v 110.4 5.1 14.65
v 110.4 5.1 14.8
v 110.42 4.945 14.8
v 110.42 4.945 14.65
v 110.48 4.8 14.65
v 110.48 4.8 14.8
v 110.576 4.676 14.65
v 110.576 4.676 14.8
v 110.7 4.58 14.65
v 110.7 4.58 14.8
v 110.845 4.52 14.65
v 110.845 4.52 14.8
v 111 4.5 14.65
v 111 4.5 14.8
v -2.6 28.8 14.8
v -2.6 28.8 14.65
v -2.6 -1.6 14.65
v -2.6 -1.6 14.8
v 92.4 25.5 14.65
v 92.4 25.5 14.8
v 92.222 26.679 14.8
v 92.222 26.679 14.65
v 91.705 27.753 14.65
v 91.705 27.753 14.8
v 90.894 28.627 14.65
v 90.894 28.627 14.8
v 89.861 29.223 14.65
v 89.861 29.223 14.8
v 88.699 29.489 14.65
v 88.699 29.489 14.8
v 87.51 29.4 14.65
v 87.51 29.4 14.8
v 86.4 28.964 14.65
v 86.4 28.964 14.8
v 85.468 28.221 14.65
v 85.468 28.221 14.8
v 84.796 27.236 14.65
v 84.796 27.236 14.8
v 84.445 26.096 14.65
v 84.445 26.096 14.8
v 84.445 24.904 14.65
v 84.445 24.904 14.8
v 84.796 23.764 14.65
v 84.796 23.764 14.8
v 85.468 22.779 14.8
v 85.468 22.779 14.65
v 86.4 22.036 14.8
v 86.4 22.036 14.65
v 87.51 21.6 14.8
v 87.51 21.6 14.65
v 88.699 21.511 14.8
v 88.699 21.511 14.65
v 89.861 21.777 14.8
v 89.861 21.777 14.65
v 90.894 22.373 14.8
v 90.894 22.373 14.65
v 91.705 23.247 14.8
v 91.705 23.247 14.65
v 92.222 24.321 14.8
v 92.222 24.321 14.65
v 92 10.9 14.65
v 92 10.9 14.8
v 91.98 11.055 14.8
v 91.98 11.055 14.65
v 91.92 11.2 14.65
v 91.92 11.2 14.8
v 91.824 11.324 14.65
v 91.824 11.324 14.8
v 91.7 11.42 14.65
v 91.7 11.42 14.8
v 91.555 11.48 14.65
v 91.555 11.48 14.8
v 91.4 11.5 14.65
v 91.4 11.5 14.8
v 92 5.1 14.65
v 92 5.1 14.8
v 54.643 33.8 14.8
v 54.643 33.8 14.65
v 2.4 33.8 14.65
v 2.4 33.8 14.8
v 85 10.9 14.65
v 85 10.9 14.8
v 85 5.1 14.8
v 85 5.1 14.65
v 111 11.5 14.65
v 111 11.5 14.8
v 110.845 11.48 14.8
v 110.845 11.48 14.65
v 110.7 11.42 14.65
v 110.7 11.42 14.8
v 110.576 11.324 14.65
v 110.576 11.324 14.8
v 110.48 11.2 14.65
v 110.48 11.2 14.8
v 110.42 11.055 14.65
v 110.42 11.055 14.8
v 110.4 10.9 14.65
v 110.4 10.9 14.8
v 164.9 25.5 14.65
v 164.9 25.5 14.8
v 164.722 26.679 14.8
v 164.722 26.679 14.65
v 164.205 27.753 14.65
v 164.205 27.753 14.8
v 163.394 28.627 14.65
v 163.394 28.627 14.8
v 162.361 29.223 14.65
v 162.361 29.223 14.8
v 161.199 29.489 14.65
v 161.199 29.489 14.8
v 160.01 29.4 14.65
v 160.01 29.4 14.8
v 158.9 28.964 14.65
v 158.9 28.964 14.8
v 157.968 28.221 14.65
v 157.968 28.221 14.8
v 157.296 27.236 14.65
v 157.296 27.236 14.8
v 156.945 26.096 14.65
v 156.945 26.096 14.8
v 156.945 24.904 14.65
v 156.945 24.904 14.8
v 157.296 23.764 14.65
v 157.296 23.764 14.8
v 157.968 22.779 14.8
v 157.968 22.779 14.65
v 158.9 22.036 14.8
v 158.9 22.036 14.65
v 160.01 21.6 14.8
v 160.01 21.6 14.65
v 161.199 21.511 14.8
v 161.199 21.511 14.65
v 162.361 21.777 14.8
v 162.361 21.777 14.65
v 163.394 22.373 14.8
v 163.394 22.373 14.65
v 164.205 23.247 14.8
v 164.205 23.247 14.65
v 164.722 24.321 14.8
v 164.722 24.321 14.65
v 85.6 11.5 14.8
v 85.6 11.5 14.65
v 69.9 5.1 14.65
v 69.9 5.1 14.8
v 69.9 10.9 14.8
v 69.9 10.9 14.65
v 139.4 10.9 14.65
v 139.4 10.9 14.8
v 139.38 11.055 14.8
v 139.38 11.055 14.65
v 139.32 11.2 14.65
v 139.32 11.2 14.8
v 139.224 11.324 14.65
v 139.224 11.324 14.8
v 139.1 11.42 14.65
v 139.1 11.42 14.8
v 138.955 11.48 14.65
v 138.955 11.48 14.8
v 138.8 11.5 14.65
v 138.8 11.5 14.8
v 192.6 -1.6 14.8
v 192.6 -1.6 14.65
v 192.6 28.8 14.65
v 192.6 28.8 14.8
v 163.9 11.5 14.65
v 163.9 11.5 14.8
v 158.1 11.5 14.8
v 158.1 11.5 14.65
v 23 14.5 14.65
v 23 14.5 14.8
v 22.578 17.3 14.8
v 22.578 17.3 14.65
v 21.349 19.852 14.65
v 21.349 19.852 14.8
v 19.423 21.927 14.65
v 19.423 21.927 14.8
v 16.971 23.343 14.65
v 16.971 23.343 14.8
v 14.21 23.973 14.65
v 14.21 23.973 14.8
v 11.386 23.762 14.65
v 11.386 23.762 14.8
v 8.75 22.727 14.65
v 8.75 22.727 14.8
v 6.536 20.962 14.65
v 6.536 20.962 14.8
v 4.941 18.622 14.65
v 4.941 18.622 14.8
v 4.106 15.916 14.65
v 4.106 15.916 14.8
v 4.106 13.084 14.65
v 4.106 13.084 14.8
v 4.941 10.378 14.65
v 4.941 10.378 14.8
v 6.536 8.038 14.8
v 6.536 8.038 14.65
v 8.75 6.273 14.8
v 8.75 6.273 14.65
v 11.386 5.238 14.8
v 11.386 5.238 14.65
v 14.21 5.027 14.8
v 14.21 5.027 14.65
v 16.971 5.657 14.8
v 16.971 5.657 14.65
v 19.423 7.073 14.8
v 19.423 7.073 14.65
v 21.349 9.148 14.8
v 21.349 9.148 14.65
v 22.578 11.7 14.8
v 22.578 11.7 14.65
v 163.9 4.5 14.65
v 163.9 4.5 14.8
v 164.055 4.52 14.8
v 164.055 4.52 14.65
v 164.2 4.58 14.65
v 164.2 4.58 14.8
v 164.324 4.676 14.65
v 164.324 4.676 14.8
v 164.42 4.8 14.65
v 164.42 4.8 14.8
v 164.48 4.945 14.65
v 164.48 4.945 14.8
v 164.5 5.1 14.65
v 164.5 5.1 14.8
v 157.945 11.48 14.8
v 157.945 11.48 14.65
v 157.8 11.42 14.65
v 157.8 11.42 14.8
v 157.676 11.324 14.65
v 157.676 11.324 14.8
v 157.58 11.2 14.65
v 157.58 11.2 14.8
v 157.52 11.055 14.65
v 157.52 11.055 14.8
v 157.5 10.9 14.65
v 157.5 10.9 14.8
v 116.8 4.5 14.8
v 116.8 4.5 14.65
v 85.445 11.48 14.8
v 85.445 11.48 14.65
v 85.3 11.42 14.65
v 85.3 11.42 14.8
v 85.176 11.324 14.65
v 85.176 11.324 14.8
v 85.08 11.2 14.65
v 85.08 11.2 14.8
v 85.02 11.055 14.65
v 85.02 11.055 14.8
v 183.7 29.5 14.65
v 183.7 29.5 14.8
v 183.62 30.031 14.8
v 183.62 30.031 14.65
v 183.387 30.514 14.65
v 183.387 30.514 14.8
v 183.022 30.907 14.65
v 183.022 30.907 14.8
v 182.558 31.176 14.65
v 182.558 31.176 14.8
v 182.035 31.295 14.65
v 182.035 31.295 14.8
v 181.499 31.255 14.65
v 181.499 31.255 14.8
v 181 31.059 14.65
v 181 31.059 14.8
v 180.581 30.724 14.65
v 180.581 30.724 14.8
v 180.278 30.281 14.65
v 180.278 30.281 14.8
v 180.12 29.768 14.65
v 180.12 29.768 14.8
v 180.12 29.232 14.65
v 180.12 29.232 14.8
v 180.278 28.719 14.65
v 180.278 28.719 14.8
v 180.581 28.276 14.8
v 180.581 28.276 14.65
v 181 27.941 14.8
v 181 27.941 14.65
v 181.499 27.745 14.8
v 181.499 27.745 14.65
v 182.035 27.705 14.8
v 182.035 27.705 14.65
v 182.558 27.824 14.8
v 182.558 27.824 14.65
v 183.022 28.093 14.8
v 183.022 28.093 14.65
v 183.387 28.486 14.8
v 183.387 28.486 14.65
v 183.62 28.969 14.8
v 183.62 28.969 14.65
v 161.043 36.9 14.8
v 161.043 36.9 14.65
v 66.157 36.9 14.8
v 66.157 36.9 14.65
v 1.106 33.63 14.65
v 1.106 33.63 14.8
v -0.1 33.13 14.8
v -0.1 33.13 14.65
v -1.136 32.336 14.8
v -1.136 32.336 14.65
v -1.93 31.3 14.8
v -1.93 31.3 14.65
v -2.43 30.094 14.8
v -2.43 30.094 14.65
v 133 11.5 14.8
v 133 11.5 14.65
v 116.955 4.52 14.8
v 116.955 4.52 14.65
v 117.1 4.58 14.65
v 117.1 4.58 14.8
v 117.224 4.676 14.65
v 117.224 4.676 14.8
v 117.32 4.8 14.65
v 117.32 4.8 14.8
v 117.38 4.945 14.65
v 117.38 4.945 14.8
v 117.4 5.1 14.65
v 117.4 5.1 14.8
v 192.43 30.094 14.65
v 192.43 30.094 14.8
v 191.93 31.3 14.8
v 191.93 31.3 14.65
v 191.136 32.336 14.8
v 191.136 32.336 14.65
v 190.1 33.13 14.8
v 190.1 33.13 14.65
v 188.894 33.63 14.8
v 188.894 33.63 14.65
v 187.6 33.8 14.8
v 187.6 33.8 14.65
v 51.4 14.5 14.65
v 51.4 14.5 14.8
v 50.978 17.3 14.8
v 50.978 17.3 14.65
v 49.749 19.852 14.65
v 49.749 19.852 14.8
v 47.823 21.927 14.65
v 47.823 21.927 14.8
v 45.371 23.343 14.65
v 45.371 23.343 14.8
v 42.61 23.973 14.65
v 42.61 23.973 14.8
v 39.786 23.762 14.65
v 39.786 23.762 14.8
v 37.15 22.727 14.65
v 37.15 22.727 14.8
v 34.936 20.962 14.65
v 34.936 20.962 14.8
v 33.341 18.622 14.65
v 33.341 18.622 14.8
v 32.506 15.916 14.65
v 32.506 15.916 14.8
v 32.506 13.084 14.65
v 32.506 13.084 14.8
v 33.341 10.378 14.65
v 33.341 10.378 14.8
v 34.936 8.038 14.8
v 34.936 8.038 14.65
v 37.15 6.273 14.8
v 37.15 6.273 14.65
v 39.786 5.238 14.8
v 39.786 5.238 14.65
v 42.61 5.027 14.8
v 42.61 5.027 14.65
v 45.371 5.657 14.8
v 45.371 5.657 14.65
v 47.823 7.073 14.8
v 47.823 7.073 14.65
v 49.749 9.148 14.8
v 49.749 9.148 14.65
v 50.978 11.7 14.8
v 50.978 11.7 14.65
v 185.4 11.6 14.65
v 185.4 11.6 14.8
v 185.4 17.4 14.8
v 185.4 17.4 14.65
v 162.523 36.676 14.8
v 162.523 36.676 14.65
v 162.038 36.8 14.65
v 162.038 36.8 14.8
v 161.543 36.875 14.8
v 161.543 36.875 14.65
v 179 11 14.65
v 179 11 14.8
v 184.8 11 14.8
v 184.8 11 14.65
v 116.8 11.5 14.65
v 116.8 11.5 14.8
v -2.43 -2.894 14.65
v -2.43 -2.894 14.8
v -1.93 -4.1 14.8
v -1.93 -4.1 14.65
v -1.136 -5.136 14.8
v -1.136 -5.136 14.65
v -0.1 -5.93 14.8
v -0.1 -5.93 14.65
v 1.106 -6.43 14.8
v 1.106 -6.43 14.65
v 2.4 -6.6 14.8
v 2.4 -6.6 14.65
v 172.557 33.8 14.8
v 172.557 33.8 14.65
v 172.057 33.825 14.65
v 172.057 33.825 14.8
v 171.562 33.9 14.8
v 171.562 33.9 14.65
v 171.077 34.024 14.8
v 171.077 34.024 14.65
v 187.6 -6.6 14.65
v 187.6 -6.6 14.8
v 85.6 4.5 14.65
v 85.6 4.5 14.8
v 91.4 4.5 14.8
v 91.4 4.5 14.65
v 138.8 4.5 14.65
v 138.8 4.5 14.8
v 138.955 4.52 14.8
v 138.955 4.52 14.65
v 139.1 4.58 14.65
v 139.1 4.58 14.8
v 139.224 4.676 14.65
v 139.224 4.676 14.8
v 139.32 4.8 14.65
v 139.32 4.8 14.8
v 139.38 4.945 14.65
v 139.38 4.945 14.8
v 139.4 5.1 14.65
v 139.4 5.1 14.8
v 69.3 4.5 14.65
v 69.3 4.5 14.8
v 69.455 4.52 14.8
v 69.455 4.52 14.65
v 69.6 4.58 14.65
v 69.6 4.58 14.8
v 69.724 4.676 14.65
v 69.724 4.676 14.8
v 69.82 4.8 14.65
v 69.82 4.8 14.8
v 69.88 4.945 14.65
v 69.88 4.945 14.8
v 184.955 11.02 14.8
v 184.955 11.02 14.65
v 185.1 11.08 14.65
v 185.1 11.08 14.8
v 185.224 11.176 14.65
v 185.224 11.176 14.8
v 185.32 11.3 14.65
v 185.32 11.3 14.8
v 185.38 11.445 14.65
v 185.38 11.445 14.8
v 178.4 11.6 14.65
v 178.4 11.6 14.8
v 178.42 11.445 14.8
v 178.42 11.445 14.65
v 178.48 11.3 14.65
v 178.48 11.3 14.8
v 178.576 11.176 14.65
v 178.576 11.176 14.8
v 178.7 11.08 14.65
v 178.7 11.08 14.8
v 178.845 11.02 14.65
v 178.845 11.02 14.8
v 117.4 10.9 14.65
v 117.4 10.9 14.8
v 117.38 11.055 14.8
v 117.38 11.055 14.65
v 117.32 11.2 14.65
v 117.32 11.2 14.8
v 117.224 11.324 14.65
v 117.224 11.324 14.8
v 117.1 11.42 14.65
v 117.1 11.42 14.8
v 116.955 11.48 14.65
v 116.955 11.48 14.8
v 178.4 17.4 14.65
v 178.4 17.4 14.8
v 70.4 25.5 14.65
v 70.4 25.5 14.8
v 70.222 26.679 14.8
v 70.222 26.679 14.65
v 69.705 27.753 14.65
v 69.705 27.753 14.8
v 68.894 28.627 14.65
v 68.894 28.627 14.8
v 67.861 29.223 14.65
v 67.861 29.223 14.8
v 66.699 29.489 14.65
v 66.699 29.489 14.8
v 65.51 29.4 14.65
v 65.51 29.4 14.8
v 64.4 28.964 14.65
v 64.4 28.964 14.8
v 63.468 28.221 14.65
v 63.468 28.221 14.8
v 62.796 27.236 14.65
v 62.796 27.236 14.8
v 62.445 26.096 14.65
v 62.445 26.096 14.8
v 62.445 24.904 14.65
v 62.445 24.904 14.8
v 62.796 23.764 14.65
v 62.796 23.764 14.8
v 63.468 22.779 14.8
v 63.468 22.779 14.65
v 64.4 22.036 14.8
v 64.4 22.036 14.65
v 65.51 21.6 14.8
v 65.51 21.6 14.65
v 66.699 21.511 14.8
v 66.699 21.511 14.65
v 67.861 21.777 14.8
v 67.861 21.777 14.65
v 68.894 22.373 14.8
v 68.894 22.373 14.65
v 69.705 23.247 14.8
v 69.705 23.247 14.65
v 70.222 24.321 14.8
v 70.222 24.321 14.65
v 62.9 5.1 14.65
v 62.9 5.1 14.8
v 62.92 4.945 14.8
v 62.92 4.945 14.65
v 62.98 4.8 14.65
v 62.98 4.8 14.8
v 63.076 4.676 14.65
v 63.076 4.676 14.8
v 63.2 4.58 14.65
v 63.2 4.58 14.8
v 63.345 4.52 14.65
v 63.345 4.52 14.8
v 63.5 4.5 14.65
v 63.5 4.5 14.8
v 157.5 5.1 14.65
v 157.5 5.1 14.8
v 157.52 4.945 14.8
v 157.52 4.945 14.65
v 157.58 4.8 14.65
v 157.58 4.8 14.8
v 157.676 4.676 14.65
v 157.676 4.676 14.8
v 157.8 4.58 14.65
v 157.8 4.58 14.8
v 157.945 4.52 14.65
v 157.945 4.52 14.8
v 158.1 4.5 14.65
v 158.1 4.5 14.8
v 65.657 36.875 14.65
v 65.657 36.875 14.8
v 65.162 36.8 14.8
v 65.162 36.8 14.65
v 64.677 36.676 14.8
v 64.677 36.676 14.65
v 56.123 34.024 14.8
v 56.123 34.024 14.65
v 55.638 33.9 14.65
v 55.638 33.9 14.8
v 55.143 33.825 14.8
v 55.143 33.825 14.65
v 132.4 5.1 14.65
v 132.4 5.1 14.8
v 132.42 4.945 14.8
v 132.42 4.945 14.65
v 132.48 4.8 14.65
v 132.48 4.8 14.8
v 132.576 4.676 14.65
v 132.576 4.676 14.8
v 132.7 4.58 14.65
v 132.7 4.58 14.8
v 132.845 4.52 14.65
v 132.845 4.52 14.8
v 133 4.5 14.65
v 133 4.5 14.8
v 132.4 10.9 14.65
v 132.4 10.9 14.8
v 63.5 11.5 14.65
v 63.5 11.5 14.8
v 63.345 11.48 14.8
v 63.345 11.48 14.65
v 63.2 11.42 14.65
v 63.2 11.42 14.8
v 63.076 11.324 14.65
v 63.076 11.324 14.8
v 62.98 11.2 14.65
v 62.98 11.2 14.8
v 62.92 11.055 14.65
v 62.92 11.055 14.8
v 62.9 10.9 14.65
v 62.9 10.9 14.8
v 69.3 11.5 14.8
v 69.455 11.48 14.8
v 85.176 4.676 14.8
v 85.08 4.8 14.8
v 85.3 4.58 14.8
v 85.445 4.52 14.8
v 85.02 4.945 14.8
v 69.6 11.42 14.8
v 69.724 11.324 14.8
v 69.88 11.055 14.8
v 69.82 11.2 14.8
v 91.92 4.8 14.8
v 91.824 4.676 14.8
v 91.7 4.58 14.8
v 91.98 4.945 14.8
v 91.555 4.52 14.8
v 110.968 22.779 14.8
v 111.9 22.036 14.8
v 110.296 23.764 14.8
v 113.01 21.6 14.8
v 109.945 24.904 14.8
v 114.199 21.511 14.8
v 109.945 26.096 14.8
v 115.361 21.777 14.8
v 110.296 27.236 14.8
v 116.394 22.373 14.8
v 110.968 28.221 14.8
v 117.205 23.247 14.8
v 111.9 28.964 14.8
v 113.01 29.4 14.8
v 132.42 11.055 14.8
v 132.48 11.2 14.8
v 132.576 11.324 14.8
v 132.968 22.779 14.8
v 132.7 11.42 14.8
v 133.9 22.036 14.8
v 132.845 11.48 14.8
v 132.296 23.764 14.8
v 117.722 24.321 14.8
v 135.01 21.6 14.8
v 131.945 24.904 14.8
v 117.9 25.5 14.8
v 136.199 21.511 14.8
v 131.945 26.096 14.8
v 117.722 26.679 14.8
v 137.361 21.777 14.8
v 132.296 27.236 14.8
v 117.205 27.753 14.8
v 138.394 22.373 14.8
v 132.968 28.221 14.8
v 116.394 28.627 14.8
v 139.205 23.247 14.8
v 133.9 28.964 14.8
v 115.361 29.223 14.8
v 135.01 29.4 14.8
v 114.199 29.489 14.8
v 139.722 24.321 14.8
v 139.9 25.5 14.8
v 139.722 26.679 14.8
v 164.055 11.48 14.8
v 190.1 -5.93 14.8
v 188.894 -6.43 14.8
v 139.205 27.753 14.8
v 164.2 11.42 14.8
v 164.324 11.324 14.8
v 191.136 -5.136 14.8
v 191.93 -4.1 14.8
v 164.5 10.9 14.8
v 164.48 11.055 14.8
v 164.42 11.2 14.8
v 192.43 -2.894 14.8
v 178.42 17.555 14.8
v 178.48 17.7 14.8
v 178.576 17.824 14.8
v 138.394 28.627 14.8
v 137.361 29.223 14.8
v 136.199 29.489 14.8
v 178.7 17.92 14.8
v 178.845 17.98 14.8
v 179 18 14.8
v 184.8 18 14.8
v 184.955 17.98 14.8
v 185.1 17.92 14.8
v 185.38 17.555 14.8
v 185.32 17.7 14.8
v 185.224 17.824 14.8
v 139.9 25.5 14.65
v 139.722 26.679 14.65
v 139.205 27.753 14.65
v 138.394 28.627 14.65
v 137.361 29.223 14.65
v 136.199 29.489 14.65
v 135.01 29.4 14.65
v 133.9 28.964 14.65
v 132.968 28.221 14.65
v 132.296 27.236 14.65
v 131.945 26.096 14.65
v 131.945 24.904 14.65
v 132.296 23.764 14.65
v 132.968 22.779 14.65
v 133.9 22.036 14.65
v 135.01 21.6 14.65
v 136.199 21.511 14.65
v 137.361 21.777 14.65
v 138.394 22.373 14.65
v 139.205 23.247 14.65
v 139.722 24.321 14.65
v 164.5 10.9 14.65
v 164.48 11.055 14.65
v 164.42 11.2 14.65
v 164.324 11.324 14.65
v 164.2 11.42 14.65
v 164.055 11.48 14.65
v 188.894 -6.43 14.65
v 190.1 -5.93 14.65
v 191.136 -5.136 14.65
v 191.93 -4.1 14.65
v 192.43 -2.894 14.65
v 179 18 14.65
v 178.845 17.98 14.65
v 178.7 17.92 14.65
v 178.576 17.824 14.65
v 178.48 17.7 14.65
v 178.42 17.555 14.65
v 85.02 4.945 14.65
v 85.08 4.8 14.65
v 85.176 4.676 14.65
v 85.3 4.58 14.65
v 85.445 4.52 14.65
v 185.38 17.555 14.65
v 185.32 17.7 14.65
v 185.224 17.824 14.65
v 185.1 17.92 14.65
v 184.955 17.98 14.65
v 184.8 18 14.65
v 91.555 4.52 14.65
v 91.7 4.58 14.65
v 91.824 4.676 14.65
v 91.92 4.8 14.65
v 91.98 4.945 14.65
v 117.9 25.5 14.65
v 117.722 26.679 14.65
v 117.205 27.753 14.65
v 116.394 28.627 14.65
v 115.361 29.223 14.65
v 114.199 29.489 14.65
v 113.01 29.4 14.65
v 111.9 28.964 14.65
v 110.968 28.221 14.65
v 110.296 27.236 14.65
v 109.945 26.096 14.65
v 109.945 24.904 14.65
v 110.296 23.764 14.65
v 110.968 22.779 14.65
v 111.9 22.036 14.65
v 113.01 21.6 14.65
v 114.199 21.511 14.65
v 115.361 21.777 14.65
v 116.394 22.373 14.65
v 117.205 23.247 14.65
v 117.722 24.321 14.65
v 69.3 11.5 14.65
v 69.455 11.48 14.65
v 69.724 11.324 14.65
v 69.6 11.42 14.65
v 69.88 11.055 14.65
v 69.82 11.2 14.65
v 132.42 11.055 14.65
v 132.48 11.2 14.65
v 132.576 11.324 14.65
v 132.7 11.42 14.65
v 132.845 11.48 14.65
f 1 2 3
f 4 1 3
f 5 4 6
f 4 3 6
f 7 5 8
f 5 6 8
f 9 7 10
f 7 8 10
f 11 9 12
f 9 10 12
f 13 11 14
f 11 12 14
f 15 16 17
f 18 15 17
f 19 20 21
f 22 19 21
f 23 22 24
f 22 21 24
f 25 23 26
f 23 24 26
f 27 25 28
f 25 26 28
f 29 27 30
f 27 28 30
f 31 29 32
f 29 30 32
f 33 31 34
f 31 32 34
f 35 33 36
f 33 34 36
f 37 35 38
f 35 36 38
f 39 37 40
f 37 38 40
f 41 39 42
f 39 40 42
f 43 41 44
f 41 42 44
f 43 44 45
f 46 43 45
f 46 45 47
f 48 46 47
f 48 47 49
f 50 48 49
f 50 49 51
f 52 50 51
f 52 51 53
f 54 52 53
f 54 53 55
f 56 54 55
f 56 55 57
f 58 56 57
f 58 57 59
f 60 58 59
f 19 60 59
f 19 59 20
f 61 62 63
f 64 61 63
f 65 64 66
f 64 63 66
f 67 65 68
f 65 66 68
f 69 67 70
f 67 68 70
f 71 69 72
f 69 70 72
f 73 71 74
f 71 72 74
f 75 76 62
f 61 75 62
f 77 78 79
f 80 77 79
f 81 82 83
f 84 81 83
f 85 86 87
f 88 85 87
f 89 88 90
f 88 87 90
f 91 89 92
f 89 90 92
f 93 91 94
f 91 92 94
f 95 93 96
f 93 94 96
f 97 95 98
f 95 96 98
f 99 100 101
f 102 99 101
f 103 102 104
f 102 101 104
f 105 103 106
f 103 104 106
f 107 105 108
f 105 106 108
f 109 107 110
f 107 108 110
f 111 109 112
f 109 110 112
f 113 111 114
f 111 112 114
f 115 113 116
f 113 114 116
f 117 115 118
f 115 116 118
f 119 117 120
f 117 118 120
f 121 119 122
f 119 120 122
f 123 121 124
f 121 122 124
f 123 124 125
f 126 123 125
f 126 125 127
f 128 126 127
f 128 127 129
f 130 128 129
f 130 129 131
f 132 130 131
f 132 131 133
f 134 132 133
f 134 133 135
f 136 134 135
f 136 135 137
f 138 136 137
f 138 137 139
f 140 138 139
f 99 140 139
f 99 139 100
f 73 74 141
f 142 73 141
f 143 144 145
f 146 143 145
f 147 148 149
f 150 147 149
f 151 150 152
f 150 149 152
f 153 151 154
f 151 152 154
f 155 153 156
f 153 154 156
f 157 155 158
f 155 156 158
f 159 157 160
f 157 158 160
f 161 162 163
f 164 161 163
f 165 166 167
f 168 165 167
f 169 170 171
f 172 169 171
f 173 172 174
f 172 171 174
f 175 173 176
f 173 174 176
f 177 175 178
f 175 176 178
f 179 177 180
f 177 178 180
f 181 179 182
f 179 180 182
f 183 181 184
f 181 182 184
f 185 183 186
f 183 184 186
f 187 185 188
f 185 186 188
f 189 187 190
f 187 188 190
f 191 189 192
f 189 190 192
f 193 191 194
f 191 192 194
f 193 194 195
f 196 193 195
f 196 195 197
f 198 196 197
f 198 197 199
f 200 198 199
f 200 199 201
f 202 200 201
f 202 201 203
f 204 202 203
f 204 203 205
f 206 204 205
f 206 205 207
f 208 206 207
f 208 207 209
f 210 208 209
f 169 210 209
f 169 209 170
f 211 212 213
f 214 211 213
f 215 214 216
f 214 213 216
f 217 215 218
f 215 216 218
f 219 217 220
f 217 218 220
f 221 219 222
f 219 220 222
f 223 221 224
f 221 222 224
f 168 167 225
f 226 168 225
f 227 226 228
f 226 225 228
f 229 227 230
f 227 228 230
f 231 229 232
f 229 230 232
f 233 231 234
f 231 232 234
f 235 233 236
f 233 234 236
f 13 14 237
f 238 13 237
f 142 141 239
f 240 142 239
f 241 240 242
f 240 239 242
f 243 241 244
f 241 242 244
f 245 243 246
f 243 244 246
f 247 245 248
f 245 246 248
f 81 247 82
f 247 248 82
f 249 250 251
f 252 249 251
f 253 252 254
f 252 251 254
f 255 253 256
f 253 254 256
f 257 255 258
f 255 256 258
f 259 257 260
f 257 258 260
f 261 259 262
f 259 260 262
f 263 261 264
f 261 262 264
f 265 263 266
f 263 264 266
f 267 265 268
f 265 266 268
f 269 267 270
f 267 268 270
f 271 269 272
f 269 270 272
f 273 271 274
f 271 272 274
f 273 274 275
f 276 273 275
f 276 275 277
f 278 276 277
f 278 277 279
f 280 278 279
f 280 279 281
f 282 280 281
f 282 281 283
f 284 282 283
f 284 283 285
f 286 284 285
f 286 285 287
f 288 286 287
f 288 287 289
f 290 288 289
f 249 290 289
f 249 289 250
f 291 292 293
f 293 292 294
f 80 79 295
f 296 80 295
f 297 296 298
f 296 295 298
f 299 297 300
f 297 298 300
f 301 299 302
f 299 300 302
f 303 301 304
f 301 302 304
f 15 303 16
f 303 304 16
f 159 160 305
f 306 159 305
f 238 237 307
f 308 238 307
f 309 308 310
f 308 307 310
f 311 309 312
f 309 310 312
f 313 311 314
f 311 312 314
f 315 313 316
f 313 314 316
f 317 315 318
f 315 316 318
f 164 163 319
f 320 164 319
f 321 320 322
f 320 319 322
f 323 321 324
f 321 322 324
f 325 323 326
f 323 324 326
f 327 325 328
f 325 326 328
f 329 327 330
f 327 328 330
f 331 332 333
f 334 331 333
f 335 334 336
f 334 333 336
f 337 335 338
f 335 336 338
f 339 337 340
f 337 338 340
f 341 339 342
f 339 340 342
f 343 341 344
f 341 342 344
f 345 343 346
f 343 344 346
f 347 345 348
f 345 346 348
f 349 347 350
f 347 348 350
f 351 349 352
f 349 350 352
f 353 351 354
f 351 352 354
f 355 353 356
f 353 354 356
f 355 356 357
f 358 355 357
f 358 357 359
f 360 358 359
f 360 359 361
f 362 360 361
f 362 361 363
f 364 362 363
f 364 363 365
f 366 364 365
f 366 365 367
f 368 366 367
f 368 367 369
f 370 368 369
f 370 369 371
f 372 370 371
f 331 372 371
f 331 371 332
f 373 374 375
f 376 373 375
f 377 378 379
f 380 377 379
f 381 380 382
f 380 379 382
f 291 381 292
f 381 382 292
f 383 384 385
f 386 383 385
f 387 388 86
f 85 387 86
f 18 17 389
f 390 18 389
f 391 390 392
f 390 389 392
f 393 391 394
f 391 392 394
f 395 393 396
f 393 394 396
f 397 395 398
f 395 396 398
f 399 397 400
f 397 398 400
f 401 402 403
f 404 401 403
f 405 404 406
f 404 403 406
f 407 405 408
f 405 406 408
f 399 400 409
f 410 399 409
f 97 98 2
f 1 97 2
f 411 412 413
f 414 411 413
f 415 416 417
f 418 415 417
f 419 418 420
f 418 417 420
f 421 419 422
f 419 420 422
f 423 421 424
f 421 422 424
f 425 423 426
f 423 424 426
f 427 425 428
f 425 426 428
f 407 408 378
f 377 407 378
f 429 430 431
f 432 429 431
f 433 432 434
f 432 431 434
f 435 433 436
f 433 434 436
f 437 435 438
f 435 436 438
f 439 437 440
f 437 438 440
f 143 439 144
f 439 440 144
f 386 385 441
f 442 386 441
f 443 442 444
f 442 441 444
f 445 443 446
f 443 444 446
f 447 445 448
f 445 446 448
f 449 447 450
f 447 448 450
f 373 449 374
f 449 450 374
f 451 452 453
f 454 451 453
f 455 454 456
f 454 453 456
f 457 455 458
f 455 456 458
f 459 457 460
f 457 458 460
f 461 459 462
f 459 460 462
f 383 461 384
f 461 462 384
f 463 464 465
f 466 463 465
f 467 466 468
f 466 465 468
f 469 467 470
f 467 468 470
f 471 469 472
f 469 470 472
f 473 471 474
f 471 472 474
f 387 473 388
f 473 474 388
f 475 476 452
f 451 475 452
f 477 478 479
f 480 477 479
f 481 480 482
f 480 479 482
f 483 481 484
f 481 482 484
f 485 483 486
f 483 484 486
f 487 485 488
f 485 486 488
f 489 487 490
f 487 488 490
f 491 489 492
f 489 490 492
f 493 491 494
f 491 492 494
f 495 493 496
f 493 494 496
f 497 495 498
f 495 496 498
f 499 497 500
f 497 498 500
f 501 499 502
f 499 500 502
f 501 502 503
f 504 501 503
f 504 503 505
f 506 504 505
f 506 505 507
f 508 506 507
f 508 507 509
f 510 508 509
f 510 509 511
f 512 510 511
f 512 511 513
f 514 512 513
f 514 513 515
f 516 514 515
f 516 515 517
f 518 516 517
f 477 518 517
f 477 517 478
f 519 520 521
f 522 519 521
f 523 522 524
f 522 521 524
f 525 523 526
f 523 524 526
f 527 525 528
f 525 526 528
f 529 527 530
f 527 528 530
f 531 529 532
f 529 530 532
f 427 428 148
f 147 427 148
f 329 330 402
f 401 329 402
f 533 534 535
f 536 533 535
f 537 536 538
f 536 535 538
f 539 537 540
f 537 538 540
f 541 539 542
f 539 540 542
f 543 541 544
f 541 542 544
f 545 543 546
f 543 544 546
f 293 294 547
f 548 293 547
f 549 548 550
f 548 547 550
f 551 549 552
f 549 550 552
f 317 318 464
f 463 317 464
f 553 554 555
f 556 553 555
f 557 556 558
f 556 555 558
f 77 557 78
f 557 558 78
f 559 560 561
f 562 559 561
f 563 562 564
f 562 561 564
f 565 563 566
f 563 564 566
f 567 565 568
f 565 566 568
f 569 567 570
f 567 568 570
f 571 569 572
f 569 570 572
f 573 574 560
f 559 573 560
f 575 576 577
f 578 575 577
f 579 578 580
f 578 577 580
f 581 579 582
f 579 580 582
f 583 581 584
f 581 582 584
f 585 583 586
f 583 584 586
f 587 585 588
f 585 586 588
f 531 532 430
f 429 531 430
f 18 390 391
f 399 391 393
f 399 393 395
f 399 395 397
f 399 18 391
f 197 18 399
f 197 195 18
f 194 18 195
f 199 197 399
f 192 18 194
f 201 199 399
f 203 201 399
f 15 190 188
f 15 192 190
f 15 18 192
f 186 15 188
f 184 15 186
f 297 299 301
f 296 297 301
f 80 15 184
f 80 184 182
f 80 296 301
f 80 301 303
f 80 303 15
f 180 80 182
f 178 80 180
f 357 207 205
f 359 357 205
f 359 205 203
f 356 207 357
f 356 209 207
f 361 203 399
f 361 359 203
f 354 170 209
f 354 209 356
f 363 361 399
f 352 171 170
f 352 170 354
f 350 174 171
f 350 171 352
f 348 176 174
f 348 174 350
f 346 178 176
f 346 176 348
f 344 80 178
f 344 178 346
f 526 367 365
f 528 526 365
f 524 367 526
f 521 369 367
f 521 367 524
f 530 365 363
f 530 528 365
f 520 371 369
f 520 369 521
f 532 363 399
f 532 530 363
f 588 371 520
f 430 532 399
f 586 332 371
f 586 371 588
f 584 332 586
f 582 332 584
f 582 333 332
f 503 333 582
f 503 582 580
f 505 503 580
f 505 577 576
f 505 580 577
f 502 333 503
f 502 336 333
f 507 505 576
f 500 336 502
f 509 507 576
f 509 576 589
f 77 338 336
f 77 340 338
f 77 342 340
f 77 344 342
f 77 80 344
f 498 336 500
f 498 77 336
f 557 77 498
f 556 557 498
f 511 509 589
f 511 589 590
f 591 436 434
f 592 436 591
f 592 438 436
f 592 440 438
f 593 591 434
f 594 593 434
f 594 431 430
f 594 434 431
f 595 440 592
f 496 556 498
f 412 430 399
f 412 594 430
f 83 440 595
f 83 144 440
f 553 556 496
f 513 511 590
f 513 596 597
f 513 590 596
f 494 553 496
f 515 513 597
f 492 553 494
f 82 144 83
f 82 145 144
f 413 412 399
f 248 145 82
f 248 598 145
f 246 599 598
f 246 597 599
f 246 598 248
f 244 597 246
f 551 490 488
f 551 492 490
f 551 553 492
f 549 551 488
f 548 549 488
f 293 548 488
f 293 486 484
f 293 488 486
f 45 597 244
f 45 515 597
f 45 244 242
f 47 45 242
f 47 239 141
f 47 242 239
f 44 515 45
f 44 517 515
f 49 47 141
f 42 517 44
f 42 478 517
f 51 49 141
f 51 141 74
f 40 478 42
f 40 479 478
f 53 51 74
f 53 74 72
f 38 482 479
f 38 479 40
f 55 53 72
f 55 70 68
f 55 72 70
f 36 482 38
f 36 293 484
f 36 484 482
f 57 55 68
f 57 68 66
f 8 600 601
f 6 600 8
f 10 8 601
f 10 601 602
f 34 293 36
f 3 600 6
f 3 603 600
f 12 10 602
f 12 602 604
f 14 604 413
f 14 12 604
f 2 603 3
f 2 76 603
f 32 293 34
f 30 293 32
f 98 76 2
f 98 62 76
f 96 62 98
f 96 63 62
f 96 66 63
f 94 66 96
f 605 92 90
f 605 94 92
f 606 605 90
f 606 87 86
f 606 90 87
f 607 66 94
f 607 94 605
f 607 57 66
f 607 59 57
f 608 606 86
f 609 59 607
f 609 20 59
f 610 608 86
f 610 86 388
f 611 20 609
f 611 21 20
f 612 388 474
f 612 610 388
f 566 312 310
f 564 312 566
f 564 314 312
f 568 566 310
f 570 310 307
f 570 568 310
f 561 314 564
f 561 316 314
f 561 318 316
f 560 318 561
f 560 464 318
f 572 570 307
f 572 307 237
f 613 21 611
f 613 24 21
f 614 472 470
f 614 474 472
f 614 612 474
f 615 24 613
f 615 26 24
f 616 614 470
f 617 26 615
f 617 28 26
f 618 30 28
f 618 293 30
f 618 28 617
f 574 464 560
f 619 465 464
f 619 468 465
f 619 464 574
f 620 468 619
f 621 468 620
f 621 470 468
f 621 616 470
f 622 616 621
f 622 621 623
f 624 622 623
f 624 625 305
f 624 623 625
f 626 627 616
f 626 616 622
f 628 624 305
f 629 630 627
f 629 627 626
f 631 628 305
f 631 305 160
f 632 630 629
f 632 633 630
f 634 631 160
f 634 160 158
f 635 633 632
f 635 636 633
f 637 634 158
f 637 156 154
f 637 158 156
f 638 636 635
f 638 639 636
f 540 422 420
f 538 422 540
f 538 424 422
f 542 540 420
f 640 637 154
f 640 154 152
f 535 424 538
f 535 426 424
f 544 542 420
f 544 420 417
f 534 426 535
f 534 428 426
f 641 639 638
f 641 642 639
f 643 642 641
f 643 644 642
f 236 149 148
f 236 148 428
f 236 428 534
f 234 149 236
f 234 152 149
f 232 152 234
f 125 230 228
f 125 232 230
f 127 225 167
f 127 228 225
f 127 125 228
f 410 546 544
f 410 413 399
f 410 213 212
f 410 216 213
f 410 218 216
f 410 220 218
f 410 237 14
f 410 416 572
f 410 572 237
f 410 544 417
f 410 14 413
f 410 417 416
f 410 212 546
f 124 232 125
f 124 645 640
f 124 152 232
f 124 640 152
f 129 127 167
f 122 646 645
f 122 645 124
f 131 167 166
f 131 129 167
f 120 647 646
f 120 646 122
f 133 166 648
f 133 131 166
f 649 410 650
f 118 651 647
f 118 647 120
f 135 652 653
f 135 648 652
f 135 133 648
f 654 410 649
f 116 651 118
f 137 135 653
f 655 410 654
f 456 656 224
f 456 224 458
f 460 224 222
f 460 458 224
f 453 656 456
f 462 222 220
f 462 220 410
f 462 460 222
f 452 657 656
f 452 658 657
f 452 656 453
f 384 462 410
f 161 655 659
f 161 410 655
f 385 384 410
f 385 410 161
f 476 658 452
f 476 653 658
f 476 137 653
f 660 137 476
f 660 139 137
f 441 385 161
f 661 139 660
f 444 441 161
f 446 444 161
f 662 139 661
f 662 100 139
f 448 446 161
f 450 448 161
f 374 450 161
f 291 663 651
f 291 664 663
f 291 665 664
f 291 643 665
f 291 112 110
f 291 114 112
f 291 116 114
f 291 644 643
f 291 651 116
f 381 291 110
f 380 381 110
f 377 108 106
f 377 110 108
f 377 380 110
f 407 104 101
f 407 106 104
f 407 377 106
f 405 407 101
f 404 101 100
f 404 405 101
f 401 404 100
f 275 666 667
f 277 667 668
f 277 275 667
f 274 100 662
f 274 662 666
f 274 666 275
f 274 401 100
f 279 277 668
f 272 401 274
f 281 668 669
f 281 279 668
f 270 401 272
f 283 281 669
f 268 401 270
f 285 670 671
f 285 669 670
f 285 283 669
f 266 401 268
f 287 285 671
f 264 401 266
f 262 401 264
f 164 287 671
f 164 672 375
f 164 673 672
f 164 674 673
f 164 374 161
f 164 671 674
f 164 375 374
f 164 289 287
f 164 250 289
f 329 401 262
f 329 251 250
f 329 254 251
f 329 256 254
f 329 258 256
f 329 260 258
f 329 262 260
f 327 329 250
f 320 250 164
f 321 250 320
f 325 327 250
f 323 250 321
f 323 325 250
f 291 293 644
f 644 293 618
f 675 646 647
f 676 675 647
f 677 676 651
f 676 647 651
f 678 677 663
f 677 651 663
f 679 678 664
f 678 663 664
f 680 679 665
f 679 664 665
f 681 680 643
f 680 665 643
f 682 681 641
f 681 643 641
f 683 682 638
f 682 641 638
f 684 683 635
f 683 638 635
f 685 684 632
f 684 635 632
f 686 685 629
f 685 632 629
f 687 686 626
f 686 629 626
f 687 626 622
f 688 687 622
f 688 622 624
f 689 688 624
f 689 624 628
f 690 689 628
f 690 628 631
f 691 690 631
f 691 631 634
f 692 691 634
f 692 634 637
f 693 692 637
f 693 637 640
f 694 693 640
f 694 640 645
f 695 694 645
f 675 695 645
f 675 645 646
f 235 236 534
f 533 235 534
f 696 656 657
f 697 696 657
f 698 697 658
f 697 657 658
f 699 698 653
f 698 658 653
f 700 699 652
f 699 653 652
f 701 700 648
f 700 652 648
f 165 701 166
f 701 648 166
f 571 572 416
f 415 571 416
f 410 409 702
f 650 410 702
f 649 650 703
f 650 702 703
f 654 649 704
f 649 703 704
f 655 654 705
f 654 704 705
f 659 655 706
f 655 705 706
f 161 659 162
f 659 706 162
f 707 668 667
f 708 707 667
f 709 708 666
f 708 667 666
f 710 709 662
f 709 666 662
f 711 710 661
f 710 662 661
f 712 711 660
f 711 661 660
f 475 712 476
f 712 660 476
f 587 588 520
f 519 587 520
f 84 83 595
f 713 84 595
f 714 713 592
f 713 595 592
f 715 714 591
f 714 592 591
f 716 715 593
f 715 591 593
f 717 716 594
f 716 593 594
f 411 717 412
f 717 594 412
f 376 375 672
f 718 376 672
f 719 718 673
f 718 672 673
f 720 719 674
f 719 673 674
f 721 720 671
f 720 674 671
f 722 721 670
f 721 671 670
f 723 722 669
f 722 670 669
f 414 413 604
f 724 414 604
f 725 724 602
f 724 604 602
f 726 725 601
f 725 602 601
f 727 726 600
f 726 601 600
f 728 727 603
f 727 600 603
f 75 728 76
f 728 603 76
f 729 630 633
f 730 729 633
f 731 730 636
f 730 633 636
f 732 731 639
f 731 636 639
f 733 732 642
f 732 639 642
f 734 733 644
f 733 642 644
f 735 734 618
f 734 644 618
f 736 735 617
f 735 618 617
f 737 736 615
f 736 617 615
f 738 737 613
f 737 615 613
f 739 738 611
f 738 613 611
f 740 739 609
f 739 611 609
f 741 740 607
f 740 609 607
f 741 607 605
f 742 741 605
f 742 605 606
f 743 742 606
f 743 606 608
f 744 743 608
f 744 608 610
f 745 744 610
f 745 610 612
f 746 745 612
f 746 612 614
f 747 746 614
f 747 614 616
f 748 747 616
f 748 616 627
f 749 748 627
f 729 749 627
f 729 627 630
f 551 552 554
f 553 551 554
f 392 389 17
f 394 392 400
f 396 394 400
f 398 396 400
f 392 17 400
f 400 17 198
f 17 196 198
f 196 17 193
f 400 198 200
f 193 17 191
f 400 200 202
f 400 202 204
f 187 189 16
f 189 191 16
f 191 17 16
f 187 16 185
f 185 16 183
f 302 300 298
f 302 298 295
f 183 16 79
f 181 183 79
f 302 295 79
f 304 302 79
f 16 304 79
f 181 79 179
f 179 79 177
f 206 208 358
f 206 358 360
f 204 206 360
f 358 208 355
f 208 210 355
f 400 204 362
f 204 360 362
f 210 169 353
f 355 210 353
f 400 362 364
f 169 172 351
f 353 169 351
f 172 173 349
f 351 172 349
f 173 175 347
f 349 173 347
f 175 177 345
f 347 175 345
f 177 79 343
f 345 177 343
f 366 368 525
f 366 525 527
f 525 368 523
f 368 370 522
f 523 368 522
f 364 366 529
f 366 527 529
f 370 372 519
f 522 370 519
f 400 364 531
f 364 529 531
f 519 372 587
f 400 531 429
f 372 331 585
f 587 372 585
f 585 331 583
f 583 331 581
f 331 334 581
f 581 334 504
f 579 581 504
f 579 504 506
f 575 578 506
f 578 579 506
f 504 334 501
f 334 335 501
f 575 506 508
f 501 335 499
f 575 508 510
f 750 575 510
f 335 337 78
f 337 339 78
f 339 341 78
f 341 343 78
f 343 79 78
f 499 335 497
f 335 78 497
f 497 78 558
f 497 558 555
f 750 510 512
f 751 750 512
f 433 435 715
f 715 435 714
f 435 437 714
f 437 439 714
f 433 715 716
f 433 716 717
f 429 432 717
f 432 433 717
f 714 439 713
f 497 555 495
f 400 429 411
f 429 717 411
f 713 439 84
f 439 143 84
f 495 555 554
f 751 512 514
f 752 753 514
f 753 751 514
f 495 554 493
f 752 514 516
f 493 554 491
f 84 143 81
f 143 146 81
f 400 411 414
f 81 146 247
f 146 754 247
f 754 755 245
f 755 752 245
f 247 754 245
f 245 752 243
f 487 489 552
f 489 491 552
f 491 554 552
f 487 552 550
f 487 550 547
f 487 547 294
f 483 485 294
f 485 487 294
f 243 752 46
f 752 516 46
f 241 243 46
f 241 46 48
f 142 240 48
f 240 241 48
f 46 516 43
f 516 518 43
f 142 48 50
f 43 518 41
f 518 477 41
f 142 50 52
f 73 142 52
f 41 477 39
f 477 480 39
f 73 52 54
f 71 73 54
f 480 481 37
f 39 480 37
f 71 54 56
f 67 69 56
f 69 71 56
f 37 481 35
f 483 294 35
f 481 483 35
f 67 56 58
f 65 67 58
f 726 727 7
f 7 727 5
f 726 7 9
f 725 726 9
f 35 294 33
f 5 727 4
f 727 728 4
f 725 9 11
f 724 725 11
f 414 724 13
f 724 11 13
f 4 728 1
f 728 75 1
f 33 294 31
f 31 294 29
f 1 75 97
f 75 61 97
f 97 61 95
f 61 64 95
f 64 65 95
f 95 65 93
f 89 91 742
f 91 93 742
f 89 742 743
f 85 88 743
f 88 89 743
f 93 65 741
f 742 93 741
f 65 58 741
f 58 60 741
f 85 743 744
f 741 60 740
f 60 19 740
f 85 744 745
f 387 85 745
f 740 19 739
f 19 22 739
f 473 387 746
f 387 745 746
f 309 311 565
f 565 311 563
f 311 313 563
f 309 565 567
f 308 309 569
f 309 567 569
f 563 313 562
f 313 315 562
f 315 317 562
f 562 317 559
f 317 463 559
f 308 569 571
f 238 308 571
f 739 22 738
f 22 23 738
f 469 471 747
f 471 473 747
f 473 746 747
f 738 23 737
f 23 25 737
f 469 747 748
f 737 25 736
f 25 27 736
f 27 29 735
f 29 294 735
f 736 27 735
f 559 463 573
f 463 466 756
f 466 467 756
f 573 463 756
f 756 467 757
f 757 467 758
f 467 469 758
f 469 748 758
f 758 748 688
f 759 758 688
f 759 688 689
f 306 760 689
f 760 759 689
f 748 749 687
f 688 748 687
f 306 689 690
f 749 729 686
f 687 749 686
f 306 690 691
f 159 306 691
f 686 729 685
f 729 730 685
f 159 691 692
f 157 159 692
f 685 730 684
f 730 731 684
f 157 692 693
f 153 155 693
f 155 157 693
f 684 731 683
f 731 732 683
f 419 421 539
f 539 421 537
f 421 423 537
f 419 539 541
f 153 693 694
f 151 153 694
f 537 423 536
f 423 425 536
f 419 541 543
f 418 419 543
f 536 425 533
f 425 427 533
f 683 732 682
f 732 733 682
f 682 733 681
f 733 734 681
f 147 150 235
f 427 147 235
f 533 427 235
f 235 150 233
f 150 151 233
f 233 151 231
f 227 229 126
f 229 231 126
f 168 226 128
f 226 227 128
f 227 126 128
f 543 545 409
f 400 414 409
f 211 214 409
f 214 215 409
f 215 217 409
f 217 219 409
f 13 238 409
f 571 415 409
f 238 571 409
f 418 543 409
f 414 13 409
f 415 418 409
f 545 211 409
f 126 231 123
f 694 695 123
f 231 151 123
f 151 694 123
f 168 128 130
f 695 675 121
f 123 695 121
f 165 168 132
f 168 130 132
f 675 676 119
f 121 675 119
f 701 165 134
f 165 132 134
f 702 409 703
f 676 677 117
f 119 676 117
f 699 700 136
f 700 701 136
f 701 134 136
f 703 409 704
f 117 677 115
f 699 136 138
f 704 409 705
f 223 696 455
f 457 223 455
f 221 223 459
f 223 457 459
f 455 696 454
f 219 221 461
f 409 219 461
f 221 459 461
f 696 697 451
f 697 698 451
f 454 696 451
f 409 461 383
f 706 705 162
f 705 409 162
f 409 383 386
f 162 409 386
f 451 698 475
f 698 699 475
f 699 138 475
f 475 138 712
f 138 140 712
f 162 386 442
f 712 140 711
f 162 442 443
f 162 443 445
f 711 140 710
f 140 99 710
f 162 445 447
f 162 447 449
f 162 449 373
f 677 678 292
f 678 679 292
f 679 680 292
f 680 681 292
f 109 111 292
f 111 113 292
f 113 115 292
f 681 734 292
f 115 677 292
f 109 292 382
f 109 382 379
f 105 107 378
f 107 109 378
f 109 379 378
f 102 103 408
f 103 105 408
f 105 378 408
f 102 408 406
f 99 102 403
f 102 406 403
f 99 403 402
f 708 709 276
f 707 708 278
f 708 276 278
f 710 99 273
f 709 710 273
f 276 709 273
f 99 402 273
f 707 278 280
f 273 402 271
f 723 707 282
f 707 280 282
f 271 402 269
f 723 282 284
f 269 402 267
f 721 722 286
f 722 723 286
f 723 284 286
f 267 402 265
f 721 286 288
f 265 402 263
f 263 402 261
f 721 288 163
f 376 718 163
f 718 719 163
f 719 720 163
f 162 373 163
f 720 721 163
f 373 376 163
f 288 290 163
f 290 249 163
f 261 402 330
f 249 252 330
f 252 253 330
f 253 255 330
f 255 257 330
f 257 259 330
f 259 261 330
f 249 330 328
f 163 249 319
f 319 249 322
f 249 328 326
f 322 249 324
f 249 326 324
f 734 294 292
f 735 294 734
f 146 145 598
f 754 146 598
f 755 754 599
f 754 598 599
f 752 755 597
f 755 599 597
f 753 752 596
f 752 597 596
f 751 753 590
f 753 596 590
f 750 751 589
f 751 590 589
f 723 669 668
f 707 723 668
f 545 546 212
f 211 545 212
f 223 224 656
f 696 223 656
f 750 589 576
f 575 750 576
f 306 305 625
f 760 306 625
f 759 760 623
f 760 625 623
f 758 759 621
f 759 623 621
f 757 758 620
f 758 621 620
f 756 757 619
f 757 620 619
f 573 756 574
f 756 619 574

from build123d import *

# Parameters (mm, degrees)
PRINTED_FILM_START              = 14.65
PRINTED_FILM_DEPTH              = 0.15
OPENING_BNC_CHANNEL_0_START     = 14.9
OPENING_BNC_CHANNEL_0_PROFILE_R = 9.5
OPENING_BNC_CHANNEL_0_DEPTH     = 0.35
OPENING_BNC_CHANNEL_1_START     = 14.9
OPENING_BNC_CHANNEL_1_PROFILE_R = 9.5
OPENING_BNC_CHANNEL_1_DEPTH     = 0.35
OPENING_LED_RUN_START           = 14.9
OPENING_LED_RUN_PROFILE_R       = 1.8
OPENING_LED_RUN_DEPTH           = 0.35
OPENING_FUNC_START              = 14.9
OPENING_FUNC_PROFILE_R          = 4
OPENING_FUNC_DEPTH              = 0.35
OPENING_TRG_MODE_START          = 14.9
OPENING_TRG_MODE_DEPTH          = 0.35
OPENING_CURSOR_START            = 14.9
OPENING_CURSOR_DEPTH            = 0.35
OPENING_EN_CH1_START            = 14.9
OPENING_EN_CH1_DEPTH            = 0.35
OPENING_TRG_START               = 14.9
OPENING_TRG_PROFILE_R           = 4
OPENING_TRG_DEPTH               = 0.35
OPENING_TIME_START              = 14.9
OPENING_TIME_PROFILE_R          = 4
OPENING_TIME_DEPTH              = 0.35
OPENING_SET_CH1_START           = 14.9
OPENING_SET_CH1_PROFILE_R       = 4
OPENING_SET_CH1_DEPTH           = 0.35
OPENING_SET_CH0_START           = 14.9
OPENING_SET_CH0_PROFILE_R       = 4
OPENING_SET_CH0_DEPTH           = 0.35
OPENING_RUN_STOP_START          = 14.9
OPENING_RUN_STOP_DEPTH          = 0.35
OPENING_MENU_BACK_START         = 14.9
OPENING_MENU_BACK_DEPTH         = 0.35
OPENING_EN_CH0_START            = 14.9
OPENING_EN_CH0_DEPTH            = 0.35


with BuildPart() as part:
    # Printed_film_profile → Printed_film (new body)
    with BuildSketch(Plane.XY.offset(PRINTED_FILM_START)):
        with BuildLine():
            Line((2.4, -6.6), (187.6, -6.6))
            ThreePointArc((187.6, -6.6), (191.135533906, -5.135533906), (192.6, -1.6))
            Line((192.6, -1.6), (192.6, 28.8))
            ThreePointArc((192.6, 28.8), (191.135533906, 32.335533906), (187.6, 33.8))
            Line((187.6, 33.8), (172.557224923, 33.8))
            ThreePointArc((172.557224923, 33.8), (171.808537122, 33.856371113), (171.076731067, 34.024213369))
            Line((171.076731067, 34.024213369), (162.523268933, 36.675786631))
            ThreePointArc((162.523268933, 36.675786631), (161.791462878, 36.843628887), (161.042775077, 36.9))
            Line((161.042775077, 36.9), (66.157224923, 36.9))
            ThreePointArc((66.157224923, 36.9), (65.408537122, 36.843628887), (64.676731067, 36.675786631))
            Line((64.676731067, 36.675786631), (56.123268933, 34.024213369))
            ThreePointArc((56.123268933, 34.024213369), (55.391462878, 33.856371113), (54.642775077, 33.8))
            Line((54.642775077, 33.8), (2.4, 33.8))
            ThreePointArc((2.4, 33.8), (-1.135533906, 32.335533906), (-2.6, 28.8))
            Line((-2.6, 28.8), (-2.6, -1.6))
            ThreePointArc((-2.6, -1.6), (-1.135533906, -5.135533906), (2.4, -6.6))
        make_face()
    extrude(amount=PRINTED_FILM_DEPTH)

    # Opening_BNC_Channel_0_profile → Opening_BNC_Channel_0 (cut)
    with BuildSketch(Plane.XY.offset(OPENING_BNC_CHANNEL_0_START)):
        with Locations((13.5, 14.5)):
            Circle(OPENING_BNC_CHANNEL_0_PROFILE_R)
    extrude(amount=-OPENING_BNC_CHANNEL_0_DEPTH, mode=Mode.SUBTRACT)

    # Opening_BNC_Channel_1_profile → Opening_BNC_Channel_1 (cut)
    with BuildSketch(Plane.XY.offset(OPENING_BNC_CHANNEL_1_START)):
        with Locations((41.9, 14.5)):
            Circle(OPENING_BNC_CHANNEL_1_PROFILE_R)
    extrude(amount=-OPENING_BNC_CHANNEL_1_DEPTH, mode=Mode.SUBTRACT)

    # Opening_LED_RUN_profile → Opening_LED_RUN (cut)
    with BuildSketch(Plane.XY.offset(OPENING_LED_RUN_START)):
        with Locations((181.9, 29.5)):
            Circle(OPENING_LED_RUN_PROFILE_R)
    extrude(amount=-OPENING_LED_RUN_DEPTH, mode=Mode.SUBTRACT)

    # Opening_FUNC_profile → Opening_FUNC (cut)
    with BuildSketch(Plane.XY.offset(OPENING_FUNC_START)):
        with Locations((160.9, 25.5)):
            Circle(OPENING_FUNC_PROFILE_R)
    extrude(amount=-OPENING_FUNC_DEPTH, mode=Mode.SUBTRACT)

    # Opening_TRG_MODE_profile → Opening_TRG_MODE (cut)
    with BuildSketch(Plane.XY.offset(OPENING_TRG_MODE_START)):
        with BuildLine():
            Line((133, 4.5), (138.8, 4.5))
            ThreePointArc((138.8, 4.5), (139.224264069, 4.675735931), (139.4, 5.1))
            Line((139.4, 5.1), (139.4, 10.9))
            ThreePointArc((139.4, 10.9), (139.224264069, 11.324264069), (138.8, 11.5))
            Line((138.8, 11.5), (133, 11.5))
            ThreePointArc((133, 11.5), (132.575735931, 11.324264069), (132.4, 10.9))
            Line((132.4, 10.9), (132.4, 5.1))
            ThreePointArc((132.4, 5.1), (132.575735931, 4.675735931), (133, 4.5))
        make_face()
    extrude(amount=-OPENING_TRG_MODE_DEPTH, mode=Mode.SUBTRACT)

    # Opening_CURSOR_profile → Opening_CURSOR (cut)
    with BuildSketch(Plane.XY.offset(OPENING_CURSOR_START)):
        with BuildLine():
            Line((111, 4.5), (116.8, 4.5))
            ThreePointArc((116.8, 4.5), (117.224264069, 4.675735931), (117.4, 5.1))
            Line((117.4, 5.1), (117.4, 10.9))
            ThreePointArc((117.4, 10.9), (117.224264069, 11.324264069), (116.8, 11.5))
            Line((116.8, 11.5), (111, 11.5))
            ThreePointArc((111, 11.5), (110.575735931, 11.324264069), (110.4, 10.9))
            Line((110.4, 10.9), (110.4, 5.1))
            ThreePointArc((110.4, 5.1), (110.575735931, 4.675735931), (111, 4.5))
        make_face()
    extrude(amount=-OPENING_CURSOR_DEPTH, mode=Mode.SUBTRACT)

    # Opening_EN_CH1_profile → Opening_EN_CH1 (cut)
    with BuildSketch(Plane.XY.offset(OPENING_EN_CH1_START)):
        with BuildLine():
            Line((85.6, 4.5), (91.4, 4.5))
            ThreePointArc((91.4, 4.5), (91.824264069, 4.675735931), (92, 5.1))
            Line((92, 5.1), (92, 10.9))
            ThreePointArc((92, 10.9), (91.824264069, 11.324264069), (91.4, 11.5))
            Line((91.4, 11.5), (85.6, 11.5))
            ThreePointArc((85.6, 11.5), (85.175735931, 11.324264069), (85, 10.9))
            Line((85, 10.9), (85, 5.1))
            ThreePointArc((85, 5.1), (85.175735931, 4.675735931), (85.6, 4.5))
        make_face()
    extrude(amount=-OPENING_EN_CH1_DEPTH, mode=Mode.SUBTRACT)

    # Opening_TRG_profile → Opening_TRG (cut)
    with BuildSketch(Plane.XY.offset(OPENING_TRG_START)):
        with Locations((135.9, 25.5)):
            Circle(OPENING_TRG_PROFILE_R)
    extrude(amount=-OPENING_TRG_DEPTH, mode=Mode.SUBTRACT)

    # Opening_TIME_profile → Opening_TIME (cut)
    with BuildSketch(Plane.XY.offset(OPENING_TIME_START)):
        with Locations((113.9, 25.5)):
            Circle(OPENING_TIME_PROFILE_R)
    extrude(amount=-OPENING_TIME_DEPTH, mode=Mode.SUBTRACT)

    # Opening_SET_CH1_profile → Opening_SET_CH1 (cut)
    with BuildSketch(Plane.XY.offset(OPENING_SET_CH1_START)):
        with Locations((88.4, 25.5)):
            Circle(OPENING_SET_CH1_PROFILE_R)
    extrude(amount=-OPENING_SET_CH1_DEPTH, mode=Mode.SUBTRACT)

    # Opening_SET_CH0_profile → Opening_SET_CH0 (cut)
    with BuildSketch(Plane.XY.offset(OPENING_SET_CH0_START)):
        with Locations((66.4, 25.5)):
            Circle(OPENING_SET_CH0_PROFILE_R)
    extrude(amount=-OPENING_SET_CH0_DEPTH, mode=Mode.SUBTRACT)

    # Opening_RUN_STOP_profile → Opening_RUN_STOP (cut)
    with BuildSketch(Plane.XY.offset(OPENING_RUN_STOP_START)):
        with BuildLine():
            Line((179, 11), (184.8, 11))
            ThreePointArc((184.8, 11), (185.224264069, 11.175735931), (185.4, 11.6))
            Line((185.4, 11.6), (185.4, 17.4))
            ThreePointArc((185.4, 17.4), (185.224264069, 17.824264069), (184.8, 18))
            Line((184.8, 18), (179, 18))
            ThreePointArc((179, 18), (178.575735931, 17.824264069), (178.4, 17.4))
            Line((178.4, 17.4), (178.4, 11.6))
            ThreePointArc((178.4, 11.6), (178.575735931, 11.175735931), (179, 11))
        make_face()
    extrude(amount=-OPENING_RUN_STOP_DEPTH, mode=Mode.SUBTRACT)

    # Opening_MENU_BACK_profile → Opening_MENU_BACK (cut)
    with BuildSketch(Plane.XY.offset(OPENING_MENU_BACK_START)):
        with BuildLine():
            Line((158.1, 4.5), (163.9, 4.5))
            ThreePointArc((163.9, 4.5), (164.324264069, 4.675735931), (164.5, 5.1))
            Line((164.5, 5.1), (164.5, 10.9))
            ThreePointArc((164.5, 10.9), (164.324264069, 11.324264069), (163.9, 11.5))
            Line((163.9, 11.5), (158.1, 11.5))
            ThreePointArc((158.1, 11.5), (157.675735931, 11.324264069), (157.5, 10.9))
            Line((157.5, 10.9), (157.5, 5.1))
            ThreePointArc((157.5, 5.1), (157.675735931, 4.675735931), (158.1, 4.5))
        make_face()
    extrude(amount=-OPENING_MENU_BACK_DEPTH, mode=Mode.SUBTRACT)

    # Opening_EN_CH0_profile → Opening_EN_CH0 (cut)
    with BuildSketch(Plane.XY.offset(OPENING_EN_CH0_START)):
        with BuildLine():
            Line((63.5, 4.5), (69.3, 4.5))
            ThreePointArc((69.3, 4.5), (69.724264069, 4.675735931), (69.9, 5.1))
            Line((69.9, 5.1), (69.9, 10.9))
            ThreePointArc((69.9, 10.9), (69.724264069, 11.324264069), (69.3, 11.5))
            Line((69.3, 11.5), (63.5, 11.5))
            ThreePointArc((63.5, 11.5), (63.075735931, 11.324264069), (62.9, 10.9))
            Line((62.9, 10.9), (62.9, 5.1))
            ThreePointArc((62.9, 5.1), (63.075735931, 4.675735931), (63.5, 4.5))
        make_face()
    extrude(amount=-OPENING_EN_CH0_DEPTH, mode=Mode.SUBTRACT)


solid = part.part
